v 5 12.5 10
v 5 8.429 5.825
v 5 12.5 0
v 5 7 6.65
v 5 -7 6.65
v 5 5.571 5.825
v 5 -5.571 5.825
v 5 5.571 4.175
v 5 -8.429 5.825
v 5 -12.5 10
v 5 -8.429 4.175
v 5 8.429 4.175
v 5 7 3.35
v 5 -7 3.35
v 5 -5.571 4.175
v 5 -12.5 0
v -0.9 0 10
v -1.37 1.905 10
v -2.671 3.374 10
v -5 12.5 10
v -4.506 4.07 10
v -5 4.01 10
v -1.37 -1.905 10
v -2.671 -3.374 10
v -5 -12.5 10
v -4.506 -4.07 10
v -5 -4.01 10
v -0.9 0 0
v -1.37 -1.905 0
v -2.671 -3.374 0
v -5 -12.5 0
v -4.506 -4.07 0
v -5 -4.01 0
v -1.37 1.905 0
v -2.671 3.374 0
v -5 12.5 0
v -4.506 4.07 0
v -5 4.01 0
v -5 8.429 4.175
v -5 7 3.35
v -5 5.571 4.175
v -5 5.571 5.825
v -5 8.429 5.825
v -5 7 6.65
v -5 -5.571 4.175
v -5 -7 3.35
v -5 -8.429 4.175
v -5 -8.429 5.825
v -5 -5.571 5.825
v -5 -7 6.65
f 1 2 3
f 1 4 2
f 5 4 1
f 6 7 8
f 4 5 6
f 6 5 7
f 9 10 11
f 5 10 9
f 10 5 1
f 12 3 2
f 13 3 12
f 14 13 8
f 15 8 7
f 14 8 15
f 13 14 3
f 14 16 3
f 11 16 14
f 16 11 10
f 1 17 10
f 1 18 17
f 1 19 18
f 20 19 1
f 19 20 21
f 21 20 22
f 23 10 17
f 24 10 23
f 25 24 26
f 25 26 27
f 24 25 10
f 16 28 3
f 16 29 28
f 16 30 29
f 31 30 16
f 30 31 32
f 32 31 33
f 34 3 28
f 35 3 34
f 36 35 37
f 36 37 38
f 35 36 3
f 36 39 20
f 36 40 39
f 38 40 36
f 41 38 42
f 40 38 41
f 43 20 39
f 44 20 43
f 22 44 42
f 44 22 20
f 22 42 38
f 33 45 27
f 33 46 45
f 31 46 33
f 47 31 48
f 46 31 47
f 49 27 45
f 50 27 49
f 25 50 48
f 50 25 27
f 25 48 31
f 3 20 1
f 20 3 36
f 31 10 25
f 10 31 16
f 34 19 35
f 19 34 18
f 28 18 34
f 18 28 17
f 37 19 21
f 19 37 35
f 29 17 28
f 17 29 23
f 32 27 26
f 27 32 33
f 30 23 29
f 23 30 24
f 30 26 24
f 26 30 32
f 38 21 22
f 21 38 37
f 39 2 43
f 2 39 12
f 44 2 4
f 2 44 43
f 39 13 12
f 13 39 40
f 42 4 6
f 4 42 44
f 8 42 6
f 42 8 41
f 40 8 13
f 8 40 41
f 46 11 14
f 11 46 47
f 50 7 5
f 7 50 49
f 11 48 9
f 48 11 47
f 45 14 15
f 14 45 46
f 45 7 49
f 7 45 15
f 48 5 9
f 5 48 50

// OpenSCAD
// file: configuration.scad
// PRUSA Mendel  
// Configuration file
// GNU GPL v2
// Josef Průša
// josefprusa@me.com
// prusadjs.cz
// http://www.reprap.org/wiki/Prusa_Mendel
// http://github.com/prusajr/PrusaMendel

// PLEASE SELECT ONE OF THE CONFIGURATIONS BELOW
// BY UN-COMMENTING IT

variant=0; //0 for metric
//variant=1; //1 for SAE
if(variant==0){
echo("variant: metric");
}else if(variant==1){
echo("variant: sae");
} else{
echo("WARNING: INVALID CONFIGURATION");
}


vars=[
//[m8_dia, m8_nut, m4_dia, m4_nut, m3_dia, m3_nut, bush_dia, mot_shaft, bush_rod, bush_outerdia, bush_length]
[8.3,16.4,4.3,9,3.3,7,11,5.3,8,16,11],//metric
[9,15.7,5.5,10.6,5.5,10.6,11.5,5.3,7.9375,16,11]//SAE
];

//BUSHING TYPE Can generate three versions
// 1 - regular old ones
// 2 - helical ones
// 3 - holders for brass or any other bought bushings
bushing_type = 2;

//Round corner diameter
round_corner_diameter = 8;

//X end parameters
axis_diameter_real = 4;
axis_diameter_larger = 4.2 ;
pressure_pad_height = 0.7;

//Thin wall size
layer_height = 0.4;
perimeter_width_over_thicknes = 1.6;
infill_widht_over_thickness = 1.55;
thin_wall = 2*(perimeter_width_over_thicknes*layer_height+infill_widht_over_thickness*layer_height);
if(thin_wall<2){
	echo("Check thin wall size, its below 2mm!");
}
echo(thin_wall);

//DO NOT TOUCH THIS SECTION!
m8_diameter = vars[variant][0];
m8_nut_diameter = vars[variant][1];
m4_diameter = vars[variant][2];
m4_nut_diameter = vars[variant][3];
m3_diameter = vars[variant][4];
m3_nut_diameter = vars[variant][5];
bushing_diameter = vars[variant][6];
motor_shaft=vars[variant][7];
bushing_rodsize = vars[variant][8];
bushing_outerDiameter = vars[variant][9];
bushing_lenght = vars[variant][10];


// MINI-HUXLEY VERSION (TODO, just place holder)
// include <configuration-huxley.scad>

// MEGA VERSION (TODO, just place holder)
// include <configuration-mega.scad>


// Some basic functions, probably should be somewhere else
module roundcorner(diameter){
	difference(){
		cube(size = [diameter,diameter,99], center = false);
		translate(v = [diameter, diameter, 0]) cylinder(h = 100, r=diameter, center=true);
	}
}
module polyhole(h, d) {
    n = max(round(2 * d),3);
    rotate([0,0,180])
        cylinder(h = h, r = (d / 2) / cos (180 / n), $fn = n);
}
// main file
// PRUSA Mendel  
// Rod clamp
// GNU GPL v2
// Josef Průša
// josefprusa@me.com
// prusadjs.cz
// http://www.reprap.org/wiki/Prusa_Mendel
// http://github.com/prusajr/PrusaMendel


include <configuration.scad>

/**
 * @name Rod clamp
 * @category Printed
 */  

module rodclamp(){ 
translate([0,0,5]) difference(){
cube([10,25,10],center=true);
translate([-5,0,0]) cylinder(r=4.1,h=20,center=true);
translate([-10,7,0]) rotate([0,90,0]) cylinder(r=m3_diameter/2,h=40,center=true);
translate([-10,-7,0]) rotate([0,90,0]) cylinder(r=m3_diameter/2,h=40,center=true);
}
}

rodclamp();
//cube([100,100,0.01],center=true);
